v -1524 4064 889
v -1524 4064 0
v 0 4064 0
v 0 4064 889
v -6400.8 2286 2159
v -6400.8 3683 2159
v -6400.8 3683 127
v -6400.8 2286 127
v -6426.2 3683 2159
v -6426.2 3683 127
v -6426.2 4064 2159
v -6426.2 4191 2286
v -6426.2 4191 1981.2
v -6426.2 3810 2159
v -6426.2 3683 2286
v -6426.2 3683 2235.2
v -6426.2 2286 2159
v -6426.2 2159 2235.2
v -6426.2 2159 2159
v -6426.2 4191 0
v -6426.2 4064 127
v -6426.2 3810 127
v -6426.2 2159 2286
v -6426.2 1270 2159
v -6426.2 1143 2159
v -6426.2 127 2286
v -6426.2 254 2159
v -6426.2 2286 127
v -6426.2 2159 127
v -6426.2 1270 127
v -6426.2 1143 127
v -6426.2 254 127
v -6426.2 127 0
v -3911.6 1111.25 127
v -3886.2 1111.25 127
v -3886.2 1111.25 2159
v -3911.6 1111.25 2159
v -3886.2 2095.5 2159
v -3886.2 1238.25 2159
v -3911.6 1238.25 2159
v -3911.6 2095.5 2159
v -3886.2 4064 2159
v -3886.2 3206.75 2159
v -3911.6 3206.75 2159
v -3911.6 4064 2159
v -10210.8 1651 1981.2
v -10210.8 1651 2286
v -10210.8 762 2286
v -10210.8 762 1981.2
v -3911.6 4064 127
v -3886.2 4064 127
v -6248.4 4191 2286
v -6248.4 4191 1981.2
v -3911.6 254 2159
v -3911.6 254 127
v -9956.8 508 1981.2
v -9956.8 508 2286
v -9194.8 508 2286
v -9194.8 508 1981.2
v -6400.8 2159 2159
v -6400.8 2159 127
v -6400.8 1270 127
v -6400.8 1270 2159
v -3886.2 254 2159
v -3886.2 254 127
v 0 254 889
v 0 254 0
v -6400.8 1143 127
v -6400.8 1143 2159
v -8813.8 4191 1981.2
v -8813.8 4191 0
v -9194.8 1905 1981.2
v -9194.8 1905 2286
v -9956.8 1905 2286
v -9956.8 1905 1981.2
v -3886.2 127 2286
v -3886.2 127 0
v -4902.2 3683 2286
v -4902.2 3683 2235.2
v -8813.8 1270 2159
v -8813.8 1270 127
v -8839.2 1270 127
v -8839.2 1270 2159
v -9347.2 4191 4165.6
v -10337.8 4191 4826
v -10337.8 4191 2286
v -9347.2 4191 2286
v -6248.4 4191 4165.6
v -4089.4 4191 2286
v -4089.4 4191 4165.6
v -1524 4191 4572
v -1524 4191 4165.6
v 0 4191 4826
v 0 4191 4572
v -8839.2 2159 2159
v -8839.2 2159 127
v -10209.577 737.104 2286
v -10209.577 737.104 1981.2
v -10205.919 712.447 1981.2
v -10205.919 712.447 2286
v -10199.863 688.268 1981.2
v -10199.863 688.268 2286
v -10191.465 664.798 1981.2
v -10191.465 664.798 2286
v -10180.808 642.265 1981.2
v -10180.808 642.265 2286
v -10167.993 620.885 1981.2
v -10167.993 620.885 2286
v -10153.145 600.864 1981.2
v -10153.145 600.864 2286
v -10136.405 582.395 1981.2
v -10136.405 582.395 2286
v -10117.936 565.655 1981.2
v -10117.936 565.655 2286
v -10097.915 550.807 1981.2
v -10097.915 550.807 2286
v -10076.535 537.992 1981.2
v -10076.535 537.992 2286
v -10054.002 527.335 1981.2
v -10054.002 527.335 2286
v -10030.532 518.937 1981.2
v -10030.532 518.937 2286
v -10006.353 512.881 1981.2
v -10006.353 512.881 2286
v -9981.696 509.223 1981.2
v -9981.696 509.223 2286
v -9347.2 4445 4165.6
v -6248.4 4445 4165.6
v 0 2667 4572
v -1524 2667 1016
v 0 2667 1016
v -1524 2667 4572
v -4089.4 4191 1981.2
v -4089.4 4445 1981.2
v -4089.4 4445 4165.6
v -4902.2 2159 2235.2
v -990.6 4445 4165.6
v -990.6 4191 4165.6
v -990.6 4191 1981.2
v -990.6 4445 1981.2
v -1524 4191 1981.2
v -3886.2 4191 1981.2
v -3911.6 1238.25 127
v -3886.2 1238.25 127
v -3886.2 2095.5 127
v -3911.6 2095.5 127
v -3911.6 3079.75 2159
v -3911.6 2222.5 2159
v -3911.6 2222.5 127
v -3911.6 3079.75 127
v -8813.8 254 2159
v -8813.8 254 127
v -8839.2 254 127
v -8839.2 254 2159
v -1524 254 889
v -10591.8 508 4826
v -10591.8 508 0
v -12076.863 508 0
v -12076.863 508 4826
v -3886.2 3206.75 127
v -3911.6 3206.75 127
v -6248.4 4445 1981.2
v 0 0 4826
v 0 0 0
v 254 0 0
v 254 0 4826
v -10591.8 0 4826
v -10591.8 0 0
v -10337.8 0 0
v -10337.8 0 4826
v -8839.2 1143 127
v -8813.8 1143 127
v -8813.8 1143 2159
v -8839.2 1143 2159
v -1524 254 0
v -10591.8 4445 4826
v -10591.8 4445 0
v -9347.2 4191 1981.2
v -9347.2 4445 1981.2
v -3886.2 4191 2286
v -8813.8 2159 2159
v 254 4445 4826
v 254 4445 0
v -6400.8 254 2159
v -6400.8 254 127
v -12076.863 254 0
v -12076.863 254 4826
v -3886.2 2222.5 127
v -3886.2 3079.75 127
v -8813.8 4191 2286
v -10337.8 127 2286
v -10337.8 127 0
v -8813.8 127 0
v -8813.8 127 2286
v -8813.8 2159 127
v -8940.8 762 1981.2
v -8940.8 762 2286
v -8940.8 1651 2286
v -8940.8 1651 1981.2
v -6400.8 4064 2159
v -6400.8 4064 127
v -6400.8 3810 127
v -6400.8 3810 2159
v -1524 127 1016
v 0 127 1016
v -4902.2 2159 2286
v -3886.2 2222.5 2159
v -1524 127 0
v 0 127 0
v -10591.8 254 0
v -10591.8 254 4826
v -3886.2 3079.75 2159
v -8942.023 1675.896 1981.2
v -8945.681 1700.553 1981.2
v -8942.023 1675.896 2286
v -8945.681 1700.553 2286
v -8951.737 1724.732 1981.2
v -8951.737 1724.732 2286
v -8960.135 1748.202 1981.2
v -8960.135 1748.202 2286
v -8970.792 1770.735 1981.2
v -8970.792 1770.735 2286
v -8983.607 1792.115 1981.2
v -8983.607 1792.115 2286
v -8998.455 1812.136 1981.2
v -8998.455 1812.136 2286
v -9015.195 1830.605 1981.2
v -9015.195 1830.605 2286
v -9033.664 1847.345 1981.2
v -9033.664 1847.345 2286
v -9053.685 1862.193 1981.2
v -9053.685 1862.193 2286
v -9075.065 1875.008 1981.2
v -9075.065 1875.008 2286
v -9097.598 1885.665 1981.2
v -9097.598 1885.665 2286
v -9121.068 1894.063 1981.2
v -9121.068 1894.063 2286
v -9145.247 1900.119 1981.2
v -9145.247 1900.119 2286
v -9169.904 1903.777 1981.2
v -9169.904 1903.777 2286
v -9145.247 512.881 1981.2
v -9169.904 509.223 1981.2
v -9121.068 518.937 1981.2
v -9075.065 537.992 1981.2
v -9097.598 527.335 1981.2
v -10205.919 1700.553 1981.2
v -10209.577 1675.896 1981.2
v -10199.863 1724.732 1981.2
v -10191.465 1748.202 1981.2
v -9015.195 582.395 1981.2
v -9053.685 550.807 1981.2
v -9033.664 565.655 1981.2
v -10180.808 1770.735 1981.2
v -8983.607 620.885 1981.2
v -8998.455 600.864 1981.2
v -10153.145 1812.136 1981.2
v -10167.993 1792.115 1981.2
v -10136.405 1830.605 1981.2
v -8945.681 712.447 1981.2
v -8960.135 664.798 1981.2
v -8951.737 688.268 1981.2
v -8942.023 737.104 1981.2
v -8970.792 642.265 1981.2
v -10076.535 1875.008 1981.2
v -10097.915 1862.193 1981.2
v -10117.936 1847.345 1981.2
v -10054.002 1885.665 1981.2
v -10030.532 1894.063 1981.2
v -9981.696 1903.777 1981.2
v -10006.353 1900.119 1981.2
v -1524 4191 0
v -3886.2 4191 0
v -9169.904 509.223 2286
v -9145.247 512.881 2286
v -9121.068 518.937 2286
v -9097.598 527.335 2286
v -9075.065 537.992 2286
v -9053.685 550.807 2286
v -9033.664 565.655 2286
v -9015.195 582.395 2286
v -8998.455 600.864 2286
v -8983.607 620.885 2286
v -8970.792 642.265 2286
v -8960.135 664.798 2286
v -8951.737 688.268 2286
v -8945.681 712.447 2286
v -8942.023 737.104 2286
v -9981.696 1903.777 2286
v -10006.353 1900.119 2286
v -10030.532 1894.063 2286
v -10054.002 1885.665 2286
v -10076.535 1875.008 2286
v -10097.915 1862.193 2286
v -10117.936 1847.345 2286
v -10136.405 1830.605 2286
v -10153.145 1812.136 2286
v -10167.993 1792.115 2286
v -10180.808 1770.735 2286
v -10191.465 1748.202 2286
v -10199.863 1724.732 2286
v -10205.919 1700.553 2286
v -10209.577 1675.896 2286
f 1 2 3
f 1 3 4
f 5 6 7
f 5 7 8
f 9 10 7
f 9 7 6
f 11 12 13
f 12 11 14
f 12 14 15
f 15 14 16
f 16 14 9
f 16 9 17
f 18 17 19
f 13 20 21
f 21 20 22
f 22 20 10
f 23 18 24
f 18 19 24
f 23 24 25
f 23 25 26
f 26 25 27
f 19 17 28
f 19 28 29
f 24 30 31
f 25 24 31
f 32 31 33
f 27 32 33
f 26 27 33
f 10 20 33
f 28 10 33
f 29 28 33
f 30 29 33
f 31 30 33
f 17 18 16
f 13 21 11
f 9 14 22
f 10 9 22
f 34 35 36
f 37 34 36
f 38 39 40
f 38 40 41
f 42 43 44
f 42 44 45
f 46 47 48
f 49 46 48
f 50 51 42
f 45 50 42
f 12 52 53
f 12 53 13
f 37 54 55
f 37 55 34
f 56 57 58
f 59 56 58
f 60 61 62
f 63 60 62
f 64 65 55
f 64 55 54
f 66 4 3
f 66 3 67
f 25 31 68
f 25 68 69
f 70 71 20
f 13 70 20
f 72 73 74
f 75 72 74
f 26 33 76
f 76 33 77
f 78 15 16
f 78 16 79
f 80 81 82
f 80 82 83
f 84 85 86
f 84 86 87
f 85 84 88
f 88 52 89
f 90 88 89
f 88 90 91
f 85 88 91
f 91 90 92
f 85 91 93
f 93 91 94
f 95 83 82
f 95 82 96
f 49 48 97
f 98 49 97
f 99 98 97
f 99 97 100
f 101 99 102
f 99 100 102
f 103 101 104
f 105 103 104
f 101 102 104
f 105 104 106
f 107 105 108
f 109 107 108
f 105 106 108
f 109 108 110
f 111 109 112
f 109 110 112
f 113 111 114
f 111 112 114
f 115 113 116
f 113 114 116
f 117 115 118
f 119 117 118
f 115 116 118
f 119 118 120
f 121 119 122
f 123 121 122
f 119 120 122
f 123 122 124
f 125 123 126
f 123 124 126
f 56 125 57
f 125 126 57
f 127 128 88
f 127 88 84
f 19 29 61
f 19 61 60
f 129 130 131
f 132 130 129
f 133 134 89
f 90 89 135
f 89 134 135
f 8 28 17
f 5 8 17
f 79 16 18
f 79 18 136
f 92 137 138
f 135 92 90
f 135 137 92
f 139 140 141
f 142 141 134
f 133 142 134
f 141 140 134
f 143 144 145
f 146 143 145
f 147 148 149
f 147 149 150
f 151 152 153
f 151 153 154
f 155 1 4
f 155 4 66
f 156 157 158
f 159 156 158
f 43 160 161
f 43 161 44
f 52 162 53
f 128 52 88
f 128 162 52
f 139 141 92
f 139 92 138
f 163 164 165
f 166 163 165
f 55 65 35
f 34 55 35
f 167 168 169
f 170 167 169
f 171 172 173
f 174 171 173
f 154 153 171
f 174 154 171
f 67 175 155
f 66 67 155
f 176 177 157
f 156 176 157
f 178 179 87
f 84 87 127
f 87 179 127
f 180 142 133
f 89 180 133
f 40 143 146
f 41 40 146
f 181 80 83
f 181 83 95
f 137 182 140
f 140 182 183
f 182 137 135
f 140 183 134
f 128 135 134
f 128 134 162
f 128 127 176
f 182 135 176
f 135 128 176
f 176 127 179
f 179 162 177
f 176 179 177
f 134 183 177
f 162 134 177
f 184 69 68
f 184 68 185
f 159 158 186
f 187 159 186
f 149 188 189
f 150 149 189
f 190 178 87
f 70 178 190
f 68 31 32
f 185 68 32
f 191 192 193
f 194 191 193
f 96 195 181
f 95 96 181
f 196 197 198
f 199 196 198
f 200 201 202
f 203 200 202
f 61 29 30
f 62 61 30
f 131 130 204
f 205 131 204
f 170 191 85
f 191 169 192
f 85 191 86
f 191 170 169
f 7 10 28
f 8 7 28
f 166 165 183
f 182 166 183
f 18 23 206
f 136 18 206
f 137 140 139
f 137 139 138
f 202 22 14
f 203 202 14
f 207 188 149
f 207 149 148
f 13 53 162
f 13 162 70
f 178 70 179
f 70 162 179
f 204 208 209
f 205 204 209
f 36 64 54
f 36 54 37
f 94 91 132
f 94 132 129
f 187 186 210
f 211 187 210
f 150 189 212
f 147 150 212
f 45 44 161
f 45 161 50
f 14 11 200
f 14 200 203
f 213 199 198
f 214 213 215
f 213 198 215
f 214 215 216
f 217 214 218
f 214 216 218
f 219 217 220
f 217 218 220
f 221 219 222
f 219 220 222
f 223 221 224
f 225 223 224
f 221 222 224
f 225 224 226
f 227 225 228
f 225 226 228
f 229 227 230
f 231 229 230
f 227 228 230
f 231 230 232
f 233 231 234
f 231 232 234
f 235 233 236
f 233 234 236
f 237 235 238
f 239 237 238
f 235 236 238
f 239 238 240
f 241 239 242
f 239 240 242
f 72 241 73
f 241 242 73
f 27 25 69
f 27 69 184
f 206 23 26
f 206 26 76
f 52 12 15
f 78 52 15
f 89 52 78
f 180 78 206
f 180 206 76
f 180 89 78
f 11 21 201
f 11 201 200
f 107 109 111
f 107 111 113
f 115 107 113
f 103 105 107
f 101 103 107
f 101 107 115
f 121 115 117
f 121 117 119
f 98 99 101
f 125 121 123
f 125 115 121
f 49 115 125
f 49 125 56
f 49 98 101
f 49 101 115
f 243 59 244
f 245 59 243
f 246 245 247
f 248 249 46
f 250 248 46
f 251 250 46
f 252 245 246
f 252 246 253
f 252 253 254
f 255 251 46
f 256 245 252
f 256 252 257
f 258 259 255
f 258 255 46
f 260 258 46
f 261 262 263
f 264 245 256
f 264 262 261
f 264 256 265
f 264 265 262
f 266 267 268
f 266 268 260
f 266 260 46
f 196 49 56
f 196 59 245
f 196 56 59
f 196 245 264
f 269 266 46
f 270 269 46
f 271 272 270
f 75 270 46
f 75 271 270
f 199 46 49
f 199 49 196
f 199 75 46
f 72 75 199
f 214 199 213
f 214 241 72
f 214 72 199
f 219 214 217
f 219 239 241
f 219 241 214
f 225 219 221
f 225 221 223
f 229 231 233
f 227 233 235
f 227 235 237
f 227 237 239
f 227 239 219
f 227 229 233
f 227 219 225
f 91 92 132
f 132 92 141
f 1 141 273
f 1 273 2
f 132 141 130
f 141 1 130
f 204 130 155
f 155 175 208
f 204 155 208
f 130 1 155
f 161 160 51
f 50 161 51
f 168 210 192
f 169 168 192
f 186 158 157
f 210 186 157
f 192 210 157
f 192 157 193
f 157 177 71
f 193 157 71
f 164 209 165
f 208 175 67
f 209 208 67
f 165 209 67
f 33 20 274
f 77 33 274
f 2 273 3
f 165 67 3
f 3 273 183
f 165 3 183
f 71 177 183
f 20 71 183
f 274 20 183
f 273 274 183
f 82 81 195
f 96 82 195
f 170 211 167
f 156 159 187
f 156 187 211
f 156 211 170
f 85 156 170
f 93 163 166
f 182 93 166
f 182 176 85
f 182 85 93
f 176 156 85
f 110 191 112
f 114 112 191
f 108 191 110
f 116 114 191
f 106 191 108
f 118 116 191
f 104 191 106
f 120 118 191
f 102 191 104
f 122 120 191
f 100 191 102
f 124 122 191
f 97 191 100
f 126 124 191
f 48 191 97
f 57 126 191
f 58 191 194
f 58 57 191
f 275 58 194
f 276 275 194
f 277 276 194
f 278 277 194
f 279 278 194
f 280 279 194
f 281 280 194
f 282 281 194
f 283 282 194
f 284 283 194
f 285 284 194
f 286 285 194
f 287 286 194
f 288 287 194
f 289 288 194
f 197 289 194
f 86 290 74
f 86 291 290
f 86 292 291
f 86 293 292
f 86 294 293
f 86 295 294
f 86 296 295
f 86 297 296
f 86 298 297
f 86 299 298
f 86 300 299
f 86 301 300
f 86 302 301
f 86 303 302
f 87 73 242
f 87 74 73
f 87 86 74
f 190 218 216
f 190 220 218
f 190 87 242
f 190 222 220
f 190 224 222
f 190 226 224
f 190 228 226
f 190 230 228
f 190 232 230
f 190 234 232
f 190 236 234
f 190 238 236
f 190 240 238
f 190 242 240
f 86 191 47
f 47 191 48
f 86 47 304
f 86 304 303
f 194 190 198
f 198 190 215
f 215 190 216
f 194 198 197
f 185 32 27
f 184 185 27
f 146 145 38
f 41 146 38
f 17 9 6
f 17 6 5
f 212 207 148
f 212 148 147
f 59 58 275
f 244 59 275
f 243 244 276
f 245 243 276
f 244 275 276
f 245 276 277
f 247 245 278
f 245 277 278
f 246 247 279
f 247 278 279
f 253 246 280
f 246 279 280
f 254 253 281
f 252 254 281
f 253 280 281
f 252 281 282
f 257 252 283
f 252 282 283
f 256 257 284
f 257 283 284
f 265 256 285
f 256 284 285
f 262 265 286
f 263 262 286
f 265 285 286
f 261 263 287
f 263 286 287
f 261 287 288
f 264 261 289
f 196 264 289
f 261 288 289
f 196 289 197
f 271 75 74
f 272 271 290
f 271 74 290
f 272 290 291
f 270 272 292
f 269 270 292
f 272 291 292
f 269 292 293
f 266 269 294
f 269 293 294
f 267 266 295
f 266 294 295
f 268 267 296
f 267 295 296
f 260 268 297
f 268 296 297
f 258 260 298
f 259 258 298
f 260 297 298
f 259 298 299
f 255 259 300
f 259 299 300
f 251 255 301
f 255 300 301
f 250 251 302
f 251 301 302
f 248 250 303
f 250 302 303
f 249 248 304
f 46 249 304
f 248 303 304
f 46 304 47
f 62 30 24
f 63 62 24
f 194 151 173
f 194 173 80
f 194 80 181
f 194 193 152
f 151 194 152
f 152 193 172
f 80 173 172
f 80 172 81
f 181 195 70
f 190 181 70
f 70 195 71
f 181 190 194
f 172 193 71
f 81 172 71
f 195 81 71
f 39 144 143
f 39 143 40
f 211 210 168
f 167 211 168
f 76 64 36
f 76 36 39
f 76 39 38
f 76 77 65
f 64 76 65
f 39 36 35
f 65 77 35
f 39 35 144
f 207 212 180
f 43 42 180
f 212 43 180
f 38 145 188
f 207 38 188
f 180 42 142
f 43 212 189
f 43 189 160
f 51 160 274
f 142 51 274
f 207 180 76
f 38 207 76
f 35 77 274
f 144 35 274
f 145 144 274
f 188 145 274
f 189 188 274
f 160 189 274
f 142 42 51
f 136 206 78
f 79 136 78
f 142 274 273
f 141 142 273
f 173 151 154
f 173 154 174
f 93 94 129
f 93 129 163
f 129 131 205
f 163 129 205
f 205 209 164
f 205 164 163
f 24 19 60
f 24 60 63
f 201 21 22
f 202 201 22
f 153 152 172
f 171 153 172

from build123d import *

# Parameters (mm, degrees)
F1_DEPTH  = 4826
F2_W      = 3098.8
F2_H      = 2184.4
F3_DEPTH  = 254
F0_W      = 1524
F0_H      = 4064
F0_H_2    = 1524
F4_DEPTH  = 2286
F0_H_3    = 2540
F5_DEPTH  = 4572
F6_W      = 2540
F6_H      = 3556
F6_W_2    = 3810
F6_H_2    = 889
F7_DEPTH  = 1524
F8_W      = 1524
F8_H      = 1524
F9_DEPTH  = 50.8
F11_DEPTH = 304.8
F12_W     = 889
F12_H     = 2032
F13_DEPTH = 25.4
F14_W     = 857.25
F14_H     = 2032
F15_DEPTH = 25.4
F16_W     = 889
F16_H     = 2032
F16_W_2   = 1397
F16_W_3   = 254
F17_DEPTH = 25.4


with BuildPart() as f1:
    # F0 (on Top) → F1 (new body)
    with BuildSketch(Plane.XY):
        Polygon((0, 127), (0, 0), (254, 0), (254, 4445), (-10591.8, 4445), (-10591.8, 508), (-12076.863289, 508), (-12076.863289, 254), (-10591.8, 254), (-10591.8, 0), (-10337.8, 0), (-10337.8, 127), (-10337.8, 4191), (-8813.8, 4191), (-6426.2, 4191), (-3886.2, 4191), (-1524, 4191), (0, 4191), (0, 2667), align=None)
    extrude(amount=F1_DEPTH)

    # F2 (on face) → F3 (cut)
    with BuildSketch(Plane(origin=(0, 4445, 0), x_dir=(-1, 0, 0), z_dir=(0, 1, 0))):
        with Locations((2540, 3073.4)):
            Rectangle(F2_W, F2_H)
        with Locations((7797.8, 3073.4)):
            Rectangle(F2_W, F2_H)
    extrude(amount=-F3_DEPTH, mode=Mode.SUBTRACT)

    # F0 (on Top) → F4 (join)
    with BuildSketch(Plane.XY):
        with Locations((-9575.8, 2159)):
            Rectangle(F0_W, F0_H)
        with Locations((-5664.2, 2921)):
            Rectangle(F0_W, F0_H_2)
        Polygon((-3886.2, 127), (-3886.2, 4191), (-6426.2, 4191), (-6426.2, 3683), (-4902.2, 3683), (-4902.2, 2159), (-6426.2, 2159), (-6426.2, 127), align=None)
    extrude(amount=F4_DEPTH)

    # F0 (on Top) → F5 (join)
    with BuildSketch(Plane.XY):
        with Locations((-762, 1397)):
            Rectangle(F0_W, F0_H_3)
        with Locations((-762, 3429)):
            Rectangle(F0_W, F0_H_2)
    extrude(amount=F5_DEPTH)

    # F6 (on face) → F7 (cut)
    with BuildSketch(Plane(origin=(-1524, 0, 0), x_dir=(0, -1, 0), z_dir=(-1, 0, 0))):
        with Locations((-1397, 2794)):
            Rectangle(F6_W, F6_H)
        with Locations((-2159, 444.5)):
            Rectangle(F6_W_2, F6_H_2)
    extrude(amount=-F7_DEPTH, mode=Mode.SUBTRACT)

    # F8 (on face) → F9 (cut)
    with BuildSketch(Plane.XY.offset(2286)):
        with Locations((-5664.2, 2921)):
            Rectangle(F8_W, F8_H)
    extrude(amount=-F9_DEPTH, mode=Mode.SUBTRACT)

    # F10 (on face) → F11 (cut)
    with BuildSketch(Plane.XY.offset(2286)):
        with BuildLine():
            ThreePointArc((-8940.8, 1651), (-9015.194878, 1830.605122), (-9194.8, 1905))
            Line((-9194.8, 1905), (-9956.8, 1905))
            ThreePointArc((-9956.8, 1905), (-10136.405122, 1830.605122), (-10210.8, 1651))
            Line((-10210.8, 1651), (-10210.8, 762))
            ThreePointArc((-10210.8, 762), (-10136.405122, 582.394878), (-9956.8, 508))
            Line((-9956.8, 508), (-9194.8, 508))
            ThreePointArc((-9194.8, 508), (-9015.194878, 582.394878), (-8940.8, 762))
            Line((-8940.8, 762), (-8940.8, 1651))
        make_face()
    extrude(amount=-F11_DEPTH, mode=Mode.SUBTRACT)

    # F12 (on face) → F13 (cut)
    with BuildSketch(Plane.YZ.offset(-8813.8)):
        with Locations((698.5, 1143)):
            Rectangle(F12_W, F12_H)
        with Locations((1714.5, 1143)):
            Rectangle(F12_W, F12_H)
    extrude(amount=-F13_DEPTH, mode=Mode.SUBTRACT)

    # F14 (on face) → F15 (cut)
    with BuildSketch(Plane.YZ.offset(-3886.2)):
        with Locations((682.625, 1143)):
            Rectangle(F14_W, F14_H)
        with Locations((1666.875, 1143)):
            Rectangle(F14_W, F14_H)
        with Locations((2651.125, 1143)):
            Rectangle(F14_W, F14_H)
        with Locations((3635.375, 1143)):
            Rectangle(F14_W, F14_H)
    extrude(amount=-F15_DEPTH, mode=Mode.SUBTRACT)

    # F16 (on face) → F17 (cut)
    with BuildSketch(Plane(origin=(-6426.2, 0, 0), x_dir=(0, -1, 0), z_dir=(-1, 0, 0))):
        with Locations((-698.5, 1143)):
            Rectangle(F16_W, F16_H)
        with Locations((-1714.5, 1143)):
            Rectangle(F16_W, F16_H)
        with Locations((-2984.5, 1143)):
            Rectangle(F16_W_2, F16_H)
        with Locations((-3937, 1143)):
            Rectangle(F16_W_3, F16_H)
    extrude(amount=-F17_DEPTH, mode=Mode.SUBTRACT)


solid = f1.part
